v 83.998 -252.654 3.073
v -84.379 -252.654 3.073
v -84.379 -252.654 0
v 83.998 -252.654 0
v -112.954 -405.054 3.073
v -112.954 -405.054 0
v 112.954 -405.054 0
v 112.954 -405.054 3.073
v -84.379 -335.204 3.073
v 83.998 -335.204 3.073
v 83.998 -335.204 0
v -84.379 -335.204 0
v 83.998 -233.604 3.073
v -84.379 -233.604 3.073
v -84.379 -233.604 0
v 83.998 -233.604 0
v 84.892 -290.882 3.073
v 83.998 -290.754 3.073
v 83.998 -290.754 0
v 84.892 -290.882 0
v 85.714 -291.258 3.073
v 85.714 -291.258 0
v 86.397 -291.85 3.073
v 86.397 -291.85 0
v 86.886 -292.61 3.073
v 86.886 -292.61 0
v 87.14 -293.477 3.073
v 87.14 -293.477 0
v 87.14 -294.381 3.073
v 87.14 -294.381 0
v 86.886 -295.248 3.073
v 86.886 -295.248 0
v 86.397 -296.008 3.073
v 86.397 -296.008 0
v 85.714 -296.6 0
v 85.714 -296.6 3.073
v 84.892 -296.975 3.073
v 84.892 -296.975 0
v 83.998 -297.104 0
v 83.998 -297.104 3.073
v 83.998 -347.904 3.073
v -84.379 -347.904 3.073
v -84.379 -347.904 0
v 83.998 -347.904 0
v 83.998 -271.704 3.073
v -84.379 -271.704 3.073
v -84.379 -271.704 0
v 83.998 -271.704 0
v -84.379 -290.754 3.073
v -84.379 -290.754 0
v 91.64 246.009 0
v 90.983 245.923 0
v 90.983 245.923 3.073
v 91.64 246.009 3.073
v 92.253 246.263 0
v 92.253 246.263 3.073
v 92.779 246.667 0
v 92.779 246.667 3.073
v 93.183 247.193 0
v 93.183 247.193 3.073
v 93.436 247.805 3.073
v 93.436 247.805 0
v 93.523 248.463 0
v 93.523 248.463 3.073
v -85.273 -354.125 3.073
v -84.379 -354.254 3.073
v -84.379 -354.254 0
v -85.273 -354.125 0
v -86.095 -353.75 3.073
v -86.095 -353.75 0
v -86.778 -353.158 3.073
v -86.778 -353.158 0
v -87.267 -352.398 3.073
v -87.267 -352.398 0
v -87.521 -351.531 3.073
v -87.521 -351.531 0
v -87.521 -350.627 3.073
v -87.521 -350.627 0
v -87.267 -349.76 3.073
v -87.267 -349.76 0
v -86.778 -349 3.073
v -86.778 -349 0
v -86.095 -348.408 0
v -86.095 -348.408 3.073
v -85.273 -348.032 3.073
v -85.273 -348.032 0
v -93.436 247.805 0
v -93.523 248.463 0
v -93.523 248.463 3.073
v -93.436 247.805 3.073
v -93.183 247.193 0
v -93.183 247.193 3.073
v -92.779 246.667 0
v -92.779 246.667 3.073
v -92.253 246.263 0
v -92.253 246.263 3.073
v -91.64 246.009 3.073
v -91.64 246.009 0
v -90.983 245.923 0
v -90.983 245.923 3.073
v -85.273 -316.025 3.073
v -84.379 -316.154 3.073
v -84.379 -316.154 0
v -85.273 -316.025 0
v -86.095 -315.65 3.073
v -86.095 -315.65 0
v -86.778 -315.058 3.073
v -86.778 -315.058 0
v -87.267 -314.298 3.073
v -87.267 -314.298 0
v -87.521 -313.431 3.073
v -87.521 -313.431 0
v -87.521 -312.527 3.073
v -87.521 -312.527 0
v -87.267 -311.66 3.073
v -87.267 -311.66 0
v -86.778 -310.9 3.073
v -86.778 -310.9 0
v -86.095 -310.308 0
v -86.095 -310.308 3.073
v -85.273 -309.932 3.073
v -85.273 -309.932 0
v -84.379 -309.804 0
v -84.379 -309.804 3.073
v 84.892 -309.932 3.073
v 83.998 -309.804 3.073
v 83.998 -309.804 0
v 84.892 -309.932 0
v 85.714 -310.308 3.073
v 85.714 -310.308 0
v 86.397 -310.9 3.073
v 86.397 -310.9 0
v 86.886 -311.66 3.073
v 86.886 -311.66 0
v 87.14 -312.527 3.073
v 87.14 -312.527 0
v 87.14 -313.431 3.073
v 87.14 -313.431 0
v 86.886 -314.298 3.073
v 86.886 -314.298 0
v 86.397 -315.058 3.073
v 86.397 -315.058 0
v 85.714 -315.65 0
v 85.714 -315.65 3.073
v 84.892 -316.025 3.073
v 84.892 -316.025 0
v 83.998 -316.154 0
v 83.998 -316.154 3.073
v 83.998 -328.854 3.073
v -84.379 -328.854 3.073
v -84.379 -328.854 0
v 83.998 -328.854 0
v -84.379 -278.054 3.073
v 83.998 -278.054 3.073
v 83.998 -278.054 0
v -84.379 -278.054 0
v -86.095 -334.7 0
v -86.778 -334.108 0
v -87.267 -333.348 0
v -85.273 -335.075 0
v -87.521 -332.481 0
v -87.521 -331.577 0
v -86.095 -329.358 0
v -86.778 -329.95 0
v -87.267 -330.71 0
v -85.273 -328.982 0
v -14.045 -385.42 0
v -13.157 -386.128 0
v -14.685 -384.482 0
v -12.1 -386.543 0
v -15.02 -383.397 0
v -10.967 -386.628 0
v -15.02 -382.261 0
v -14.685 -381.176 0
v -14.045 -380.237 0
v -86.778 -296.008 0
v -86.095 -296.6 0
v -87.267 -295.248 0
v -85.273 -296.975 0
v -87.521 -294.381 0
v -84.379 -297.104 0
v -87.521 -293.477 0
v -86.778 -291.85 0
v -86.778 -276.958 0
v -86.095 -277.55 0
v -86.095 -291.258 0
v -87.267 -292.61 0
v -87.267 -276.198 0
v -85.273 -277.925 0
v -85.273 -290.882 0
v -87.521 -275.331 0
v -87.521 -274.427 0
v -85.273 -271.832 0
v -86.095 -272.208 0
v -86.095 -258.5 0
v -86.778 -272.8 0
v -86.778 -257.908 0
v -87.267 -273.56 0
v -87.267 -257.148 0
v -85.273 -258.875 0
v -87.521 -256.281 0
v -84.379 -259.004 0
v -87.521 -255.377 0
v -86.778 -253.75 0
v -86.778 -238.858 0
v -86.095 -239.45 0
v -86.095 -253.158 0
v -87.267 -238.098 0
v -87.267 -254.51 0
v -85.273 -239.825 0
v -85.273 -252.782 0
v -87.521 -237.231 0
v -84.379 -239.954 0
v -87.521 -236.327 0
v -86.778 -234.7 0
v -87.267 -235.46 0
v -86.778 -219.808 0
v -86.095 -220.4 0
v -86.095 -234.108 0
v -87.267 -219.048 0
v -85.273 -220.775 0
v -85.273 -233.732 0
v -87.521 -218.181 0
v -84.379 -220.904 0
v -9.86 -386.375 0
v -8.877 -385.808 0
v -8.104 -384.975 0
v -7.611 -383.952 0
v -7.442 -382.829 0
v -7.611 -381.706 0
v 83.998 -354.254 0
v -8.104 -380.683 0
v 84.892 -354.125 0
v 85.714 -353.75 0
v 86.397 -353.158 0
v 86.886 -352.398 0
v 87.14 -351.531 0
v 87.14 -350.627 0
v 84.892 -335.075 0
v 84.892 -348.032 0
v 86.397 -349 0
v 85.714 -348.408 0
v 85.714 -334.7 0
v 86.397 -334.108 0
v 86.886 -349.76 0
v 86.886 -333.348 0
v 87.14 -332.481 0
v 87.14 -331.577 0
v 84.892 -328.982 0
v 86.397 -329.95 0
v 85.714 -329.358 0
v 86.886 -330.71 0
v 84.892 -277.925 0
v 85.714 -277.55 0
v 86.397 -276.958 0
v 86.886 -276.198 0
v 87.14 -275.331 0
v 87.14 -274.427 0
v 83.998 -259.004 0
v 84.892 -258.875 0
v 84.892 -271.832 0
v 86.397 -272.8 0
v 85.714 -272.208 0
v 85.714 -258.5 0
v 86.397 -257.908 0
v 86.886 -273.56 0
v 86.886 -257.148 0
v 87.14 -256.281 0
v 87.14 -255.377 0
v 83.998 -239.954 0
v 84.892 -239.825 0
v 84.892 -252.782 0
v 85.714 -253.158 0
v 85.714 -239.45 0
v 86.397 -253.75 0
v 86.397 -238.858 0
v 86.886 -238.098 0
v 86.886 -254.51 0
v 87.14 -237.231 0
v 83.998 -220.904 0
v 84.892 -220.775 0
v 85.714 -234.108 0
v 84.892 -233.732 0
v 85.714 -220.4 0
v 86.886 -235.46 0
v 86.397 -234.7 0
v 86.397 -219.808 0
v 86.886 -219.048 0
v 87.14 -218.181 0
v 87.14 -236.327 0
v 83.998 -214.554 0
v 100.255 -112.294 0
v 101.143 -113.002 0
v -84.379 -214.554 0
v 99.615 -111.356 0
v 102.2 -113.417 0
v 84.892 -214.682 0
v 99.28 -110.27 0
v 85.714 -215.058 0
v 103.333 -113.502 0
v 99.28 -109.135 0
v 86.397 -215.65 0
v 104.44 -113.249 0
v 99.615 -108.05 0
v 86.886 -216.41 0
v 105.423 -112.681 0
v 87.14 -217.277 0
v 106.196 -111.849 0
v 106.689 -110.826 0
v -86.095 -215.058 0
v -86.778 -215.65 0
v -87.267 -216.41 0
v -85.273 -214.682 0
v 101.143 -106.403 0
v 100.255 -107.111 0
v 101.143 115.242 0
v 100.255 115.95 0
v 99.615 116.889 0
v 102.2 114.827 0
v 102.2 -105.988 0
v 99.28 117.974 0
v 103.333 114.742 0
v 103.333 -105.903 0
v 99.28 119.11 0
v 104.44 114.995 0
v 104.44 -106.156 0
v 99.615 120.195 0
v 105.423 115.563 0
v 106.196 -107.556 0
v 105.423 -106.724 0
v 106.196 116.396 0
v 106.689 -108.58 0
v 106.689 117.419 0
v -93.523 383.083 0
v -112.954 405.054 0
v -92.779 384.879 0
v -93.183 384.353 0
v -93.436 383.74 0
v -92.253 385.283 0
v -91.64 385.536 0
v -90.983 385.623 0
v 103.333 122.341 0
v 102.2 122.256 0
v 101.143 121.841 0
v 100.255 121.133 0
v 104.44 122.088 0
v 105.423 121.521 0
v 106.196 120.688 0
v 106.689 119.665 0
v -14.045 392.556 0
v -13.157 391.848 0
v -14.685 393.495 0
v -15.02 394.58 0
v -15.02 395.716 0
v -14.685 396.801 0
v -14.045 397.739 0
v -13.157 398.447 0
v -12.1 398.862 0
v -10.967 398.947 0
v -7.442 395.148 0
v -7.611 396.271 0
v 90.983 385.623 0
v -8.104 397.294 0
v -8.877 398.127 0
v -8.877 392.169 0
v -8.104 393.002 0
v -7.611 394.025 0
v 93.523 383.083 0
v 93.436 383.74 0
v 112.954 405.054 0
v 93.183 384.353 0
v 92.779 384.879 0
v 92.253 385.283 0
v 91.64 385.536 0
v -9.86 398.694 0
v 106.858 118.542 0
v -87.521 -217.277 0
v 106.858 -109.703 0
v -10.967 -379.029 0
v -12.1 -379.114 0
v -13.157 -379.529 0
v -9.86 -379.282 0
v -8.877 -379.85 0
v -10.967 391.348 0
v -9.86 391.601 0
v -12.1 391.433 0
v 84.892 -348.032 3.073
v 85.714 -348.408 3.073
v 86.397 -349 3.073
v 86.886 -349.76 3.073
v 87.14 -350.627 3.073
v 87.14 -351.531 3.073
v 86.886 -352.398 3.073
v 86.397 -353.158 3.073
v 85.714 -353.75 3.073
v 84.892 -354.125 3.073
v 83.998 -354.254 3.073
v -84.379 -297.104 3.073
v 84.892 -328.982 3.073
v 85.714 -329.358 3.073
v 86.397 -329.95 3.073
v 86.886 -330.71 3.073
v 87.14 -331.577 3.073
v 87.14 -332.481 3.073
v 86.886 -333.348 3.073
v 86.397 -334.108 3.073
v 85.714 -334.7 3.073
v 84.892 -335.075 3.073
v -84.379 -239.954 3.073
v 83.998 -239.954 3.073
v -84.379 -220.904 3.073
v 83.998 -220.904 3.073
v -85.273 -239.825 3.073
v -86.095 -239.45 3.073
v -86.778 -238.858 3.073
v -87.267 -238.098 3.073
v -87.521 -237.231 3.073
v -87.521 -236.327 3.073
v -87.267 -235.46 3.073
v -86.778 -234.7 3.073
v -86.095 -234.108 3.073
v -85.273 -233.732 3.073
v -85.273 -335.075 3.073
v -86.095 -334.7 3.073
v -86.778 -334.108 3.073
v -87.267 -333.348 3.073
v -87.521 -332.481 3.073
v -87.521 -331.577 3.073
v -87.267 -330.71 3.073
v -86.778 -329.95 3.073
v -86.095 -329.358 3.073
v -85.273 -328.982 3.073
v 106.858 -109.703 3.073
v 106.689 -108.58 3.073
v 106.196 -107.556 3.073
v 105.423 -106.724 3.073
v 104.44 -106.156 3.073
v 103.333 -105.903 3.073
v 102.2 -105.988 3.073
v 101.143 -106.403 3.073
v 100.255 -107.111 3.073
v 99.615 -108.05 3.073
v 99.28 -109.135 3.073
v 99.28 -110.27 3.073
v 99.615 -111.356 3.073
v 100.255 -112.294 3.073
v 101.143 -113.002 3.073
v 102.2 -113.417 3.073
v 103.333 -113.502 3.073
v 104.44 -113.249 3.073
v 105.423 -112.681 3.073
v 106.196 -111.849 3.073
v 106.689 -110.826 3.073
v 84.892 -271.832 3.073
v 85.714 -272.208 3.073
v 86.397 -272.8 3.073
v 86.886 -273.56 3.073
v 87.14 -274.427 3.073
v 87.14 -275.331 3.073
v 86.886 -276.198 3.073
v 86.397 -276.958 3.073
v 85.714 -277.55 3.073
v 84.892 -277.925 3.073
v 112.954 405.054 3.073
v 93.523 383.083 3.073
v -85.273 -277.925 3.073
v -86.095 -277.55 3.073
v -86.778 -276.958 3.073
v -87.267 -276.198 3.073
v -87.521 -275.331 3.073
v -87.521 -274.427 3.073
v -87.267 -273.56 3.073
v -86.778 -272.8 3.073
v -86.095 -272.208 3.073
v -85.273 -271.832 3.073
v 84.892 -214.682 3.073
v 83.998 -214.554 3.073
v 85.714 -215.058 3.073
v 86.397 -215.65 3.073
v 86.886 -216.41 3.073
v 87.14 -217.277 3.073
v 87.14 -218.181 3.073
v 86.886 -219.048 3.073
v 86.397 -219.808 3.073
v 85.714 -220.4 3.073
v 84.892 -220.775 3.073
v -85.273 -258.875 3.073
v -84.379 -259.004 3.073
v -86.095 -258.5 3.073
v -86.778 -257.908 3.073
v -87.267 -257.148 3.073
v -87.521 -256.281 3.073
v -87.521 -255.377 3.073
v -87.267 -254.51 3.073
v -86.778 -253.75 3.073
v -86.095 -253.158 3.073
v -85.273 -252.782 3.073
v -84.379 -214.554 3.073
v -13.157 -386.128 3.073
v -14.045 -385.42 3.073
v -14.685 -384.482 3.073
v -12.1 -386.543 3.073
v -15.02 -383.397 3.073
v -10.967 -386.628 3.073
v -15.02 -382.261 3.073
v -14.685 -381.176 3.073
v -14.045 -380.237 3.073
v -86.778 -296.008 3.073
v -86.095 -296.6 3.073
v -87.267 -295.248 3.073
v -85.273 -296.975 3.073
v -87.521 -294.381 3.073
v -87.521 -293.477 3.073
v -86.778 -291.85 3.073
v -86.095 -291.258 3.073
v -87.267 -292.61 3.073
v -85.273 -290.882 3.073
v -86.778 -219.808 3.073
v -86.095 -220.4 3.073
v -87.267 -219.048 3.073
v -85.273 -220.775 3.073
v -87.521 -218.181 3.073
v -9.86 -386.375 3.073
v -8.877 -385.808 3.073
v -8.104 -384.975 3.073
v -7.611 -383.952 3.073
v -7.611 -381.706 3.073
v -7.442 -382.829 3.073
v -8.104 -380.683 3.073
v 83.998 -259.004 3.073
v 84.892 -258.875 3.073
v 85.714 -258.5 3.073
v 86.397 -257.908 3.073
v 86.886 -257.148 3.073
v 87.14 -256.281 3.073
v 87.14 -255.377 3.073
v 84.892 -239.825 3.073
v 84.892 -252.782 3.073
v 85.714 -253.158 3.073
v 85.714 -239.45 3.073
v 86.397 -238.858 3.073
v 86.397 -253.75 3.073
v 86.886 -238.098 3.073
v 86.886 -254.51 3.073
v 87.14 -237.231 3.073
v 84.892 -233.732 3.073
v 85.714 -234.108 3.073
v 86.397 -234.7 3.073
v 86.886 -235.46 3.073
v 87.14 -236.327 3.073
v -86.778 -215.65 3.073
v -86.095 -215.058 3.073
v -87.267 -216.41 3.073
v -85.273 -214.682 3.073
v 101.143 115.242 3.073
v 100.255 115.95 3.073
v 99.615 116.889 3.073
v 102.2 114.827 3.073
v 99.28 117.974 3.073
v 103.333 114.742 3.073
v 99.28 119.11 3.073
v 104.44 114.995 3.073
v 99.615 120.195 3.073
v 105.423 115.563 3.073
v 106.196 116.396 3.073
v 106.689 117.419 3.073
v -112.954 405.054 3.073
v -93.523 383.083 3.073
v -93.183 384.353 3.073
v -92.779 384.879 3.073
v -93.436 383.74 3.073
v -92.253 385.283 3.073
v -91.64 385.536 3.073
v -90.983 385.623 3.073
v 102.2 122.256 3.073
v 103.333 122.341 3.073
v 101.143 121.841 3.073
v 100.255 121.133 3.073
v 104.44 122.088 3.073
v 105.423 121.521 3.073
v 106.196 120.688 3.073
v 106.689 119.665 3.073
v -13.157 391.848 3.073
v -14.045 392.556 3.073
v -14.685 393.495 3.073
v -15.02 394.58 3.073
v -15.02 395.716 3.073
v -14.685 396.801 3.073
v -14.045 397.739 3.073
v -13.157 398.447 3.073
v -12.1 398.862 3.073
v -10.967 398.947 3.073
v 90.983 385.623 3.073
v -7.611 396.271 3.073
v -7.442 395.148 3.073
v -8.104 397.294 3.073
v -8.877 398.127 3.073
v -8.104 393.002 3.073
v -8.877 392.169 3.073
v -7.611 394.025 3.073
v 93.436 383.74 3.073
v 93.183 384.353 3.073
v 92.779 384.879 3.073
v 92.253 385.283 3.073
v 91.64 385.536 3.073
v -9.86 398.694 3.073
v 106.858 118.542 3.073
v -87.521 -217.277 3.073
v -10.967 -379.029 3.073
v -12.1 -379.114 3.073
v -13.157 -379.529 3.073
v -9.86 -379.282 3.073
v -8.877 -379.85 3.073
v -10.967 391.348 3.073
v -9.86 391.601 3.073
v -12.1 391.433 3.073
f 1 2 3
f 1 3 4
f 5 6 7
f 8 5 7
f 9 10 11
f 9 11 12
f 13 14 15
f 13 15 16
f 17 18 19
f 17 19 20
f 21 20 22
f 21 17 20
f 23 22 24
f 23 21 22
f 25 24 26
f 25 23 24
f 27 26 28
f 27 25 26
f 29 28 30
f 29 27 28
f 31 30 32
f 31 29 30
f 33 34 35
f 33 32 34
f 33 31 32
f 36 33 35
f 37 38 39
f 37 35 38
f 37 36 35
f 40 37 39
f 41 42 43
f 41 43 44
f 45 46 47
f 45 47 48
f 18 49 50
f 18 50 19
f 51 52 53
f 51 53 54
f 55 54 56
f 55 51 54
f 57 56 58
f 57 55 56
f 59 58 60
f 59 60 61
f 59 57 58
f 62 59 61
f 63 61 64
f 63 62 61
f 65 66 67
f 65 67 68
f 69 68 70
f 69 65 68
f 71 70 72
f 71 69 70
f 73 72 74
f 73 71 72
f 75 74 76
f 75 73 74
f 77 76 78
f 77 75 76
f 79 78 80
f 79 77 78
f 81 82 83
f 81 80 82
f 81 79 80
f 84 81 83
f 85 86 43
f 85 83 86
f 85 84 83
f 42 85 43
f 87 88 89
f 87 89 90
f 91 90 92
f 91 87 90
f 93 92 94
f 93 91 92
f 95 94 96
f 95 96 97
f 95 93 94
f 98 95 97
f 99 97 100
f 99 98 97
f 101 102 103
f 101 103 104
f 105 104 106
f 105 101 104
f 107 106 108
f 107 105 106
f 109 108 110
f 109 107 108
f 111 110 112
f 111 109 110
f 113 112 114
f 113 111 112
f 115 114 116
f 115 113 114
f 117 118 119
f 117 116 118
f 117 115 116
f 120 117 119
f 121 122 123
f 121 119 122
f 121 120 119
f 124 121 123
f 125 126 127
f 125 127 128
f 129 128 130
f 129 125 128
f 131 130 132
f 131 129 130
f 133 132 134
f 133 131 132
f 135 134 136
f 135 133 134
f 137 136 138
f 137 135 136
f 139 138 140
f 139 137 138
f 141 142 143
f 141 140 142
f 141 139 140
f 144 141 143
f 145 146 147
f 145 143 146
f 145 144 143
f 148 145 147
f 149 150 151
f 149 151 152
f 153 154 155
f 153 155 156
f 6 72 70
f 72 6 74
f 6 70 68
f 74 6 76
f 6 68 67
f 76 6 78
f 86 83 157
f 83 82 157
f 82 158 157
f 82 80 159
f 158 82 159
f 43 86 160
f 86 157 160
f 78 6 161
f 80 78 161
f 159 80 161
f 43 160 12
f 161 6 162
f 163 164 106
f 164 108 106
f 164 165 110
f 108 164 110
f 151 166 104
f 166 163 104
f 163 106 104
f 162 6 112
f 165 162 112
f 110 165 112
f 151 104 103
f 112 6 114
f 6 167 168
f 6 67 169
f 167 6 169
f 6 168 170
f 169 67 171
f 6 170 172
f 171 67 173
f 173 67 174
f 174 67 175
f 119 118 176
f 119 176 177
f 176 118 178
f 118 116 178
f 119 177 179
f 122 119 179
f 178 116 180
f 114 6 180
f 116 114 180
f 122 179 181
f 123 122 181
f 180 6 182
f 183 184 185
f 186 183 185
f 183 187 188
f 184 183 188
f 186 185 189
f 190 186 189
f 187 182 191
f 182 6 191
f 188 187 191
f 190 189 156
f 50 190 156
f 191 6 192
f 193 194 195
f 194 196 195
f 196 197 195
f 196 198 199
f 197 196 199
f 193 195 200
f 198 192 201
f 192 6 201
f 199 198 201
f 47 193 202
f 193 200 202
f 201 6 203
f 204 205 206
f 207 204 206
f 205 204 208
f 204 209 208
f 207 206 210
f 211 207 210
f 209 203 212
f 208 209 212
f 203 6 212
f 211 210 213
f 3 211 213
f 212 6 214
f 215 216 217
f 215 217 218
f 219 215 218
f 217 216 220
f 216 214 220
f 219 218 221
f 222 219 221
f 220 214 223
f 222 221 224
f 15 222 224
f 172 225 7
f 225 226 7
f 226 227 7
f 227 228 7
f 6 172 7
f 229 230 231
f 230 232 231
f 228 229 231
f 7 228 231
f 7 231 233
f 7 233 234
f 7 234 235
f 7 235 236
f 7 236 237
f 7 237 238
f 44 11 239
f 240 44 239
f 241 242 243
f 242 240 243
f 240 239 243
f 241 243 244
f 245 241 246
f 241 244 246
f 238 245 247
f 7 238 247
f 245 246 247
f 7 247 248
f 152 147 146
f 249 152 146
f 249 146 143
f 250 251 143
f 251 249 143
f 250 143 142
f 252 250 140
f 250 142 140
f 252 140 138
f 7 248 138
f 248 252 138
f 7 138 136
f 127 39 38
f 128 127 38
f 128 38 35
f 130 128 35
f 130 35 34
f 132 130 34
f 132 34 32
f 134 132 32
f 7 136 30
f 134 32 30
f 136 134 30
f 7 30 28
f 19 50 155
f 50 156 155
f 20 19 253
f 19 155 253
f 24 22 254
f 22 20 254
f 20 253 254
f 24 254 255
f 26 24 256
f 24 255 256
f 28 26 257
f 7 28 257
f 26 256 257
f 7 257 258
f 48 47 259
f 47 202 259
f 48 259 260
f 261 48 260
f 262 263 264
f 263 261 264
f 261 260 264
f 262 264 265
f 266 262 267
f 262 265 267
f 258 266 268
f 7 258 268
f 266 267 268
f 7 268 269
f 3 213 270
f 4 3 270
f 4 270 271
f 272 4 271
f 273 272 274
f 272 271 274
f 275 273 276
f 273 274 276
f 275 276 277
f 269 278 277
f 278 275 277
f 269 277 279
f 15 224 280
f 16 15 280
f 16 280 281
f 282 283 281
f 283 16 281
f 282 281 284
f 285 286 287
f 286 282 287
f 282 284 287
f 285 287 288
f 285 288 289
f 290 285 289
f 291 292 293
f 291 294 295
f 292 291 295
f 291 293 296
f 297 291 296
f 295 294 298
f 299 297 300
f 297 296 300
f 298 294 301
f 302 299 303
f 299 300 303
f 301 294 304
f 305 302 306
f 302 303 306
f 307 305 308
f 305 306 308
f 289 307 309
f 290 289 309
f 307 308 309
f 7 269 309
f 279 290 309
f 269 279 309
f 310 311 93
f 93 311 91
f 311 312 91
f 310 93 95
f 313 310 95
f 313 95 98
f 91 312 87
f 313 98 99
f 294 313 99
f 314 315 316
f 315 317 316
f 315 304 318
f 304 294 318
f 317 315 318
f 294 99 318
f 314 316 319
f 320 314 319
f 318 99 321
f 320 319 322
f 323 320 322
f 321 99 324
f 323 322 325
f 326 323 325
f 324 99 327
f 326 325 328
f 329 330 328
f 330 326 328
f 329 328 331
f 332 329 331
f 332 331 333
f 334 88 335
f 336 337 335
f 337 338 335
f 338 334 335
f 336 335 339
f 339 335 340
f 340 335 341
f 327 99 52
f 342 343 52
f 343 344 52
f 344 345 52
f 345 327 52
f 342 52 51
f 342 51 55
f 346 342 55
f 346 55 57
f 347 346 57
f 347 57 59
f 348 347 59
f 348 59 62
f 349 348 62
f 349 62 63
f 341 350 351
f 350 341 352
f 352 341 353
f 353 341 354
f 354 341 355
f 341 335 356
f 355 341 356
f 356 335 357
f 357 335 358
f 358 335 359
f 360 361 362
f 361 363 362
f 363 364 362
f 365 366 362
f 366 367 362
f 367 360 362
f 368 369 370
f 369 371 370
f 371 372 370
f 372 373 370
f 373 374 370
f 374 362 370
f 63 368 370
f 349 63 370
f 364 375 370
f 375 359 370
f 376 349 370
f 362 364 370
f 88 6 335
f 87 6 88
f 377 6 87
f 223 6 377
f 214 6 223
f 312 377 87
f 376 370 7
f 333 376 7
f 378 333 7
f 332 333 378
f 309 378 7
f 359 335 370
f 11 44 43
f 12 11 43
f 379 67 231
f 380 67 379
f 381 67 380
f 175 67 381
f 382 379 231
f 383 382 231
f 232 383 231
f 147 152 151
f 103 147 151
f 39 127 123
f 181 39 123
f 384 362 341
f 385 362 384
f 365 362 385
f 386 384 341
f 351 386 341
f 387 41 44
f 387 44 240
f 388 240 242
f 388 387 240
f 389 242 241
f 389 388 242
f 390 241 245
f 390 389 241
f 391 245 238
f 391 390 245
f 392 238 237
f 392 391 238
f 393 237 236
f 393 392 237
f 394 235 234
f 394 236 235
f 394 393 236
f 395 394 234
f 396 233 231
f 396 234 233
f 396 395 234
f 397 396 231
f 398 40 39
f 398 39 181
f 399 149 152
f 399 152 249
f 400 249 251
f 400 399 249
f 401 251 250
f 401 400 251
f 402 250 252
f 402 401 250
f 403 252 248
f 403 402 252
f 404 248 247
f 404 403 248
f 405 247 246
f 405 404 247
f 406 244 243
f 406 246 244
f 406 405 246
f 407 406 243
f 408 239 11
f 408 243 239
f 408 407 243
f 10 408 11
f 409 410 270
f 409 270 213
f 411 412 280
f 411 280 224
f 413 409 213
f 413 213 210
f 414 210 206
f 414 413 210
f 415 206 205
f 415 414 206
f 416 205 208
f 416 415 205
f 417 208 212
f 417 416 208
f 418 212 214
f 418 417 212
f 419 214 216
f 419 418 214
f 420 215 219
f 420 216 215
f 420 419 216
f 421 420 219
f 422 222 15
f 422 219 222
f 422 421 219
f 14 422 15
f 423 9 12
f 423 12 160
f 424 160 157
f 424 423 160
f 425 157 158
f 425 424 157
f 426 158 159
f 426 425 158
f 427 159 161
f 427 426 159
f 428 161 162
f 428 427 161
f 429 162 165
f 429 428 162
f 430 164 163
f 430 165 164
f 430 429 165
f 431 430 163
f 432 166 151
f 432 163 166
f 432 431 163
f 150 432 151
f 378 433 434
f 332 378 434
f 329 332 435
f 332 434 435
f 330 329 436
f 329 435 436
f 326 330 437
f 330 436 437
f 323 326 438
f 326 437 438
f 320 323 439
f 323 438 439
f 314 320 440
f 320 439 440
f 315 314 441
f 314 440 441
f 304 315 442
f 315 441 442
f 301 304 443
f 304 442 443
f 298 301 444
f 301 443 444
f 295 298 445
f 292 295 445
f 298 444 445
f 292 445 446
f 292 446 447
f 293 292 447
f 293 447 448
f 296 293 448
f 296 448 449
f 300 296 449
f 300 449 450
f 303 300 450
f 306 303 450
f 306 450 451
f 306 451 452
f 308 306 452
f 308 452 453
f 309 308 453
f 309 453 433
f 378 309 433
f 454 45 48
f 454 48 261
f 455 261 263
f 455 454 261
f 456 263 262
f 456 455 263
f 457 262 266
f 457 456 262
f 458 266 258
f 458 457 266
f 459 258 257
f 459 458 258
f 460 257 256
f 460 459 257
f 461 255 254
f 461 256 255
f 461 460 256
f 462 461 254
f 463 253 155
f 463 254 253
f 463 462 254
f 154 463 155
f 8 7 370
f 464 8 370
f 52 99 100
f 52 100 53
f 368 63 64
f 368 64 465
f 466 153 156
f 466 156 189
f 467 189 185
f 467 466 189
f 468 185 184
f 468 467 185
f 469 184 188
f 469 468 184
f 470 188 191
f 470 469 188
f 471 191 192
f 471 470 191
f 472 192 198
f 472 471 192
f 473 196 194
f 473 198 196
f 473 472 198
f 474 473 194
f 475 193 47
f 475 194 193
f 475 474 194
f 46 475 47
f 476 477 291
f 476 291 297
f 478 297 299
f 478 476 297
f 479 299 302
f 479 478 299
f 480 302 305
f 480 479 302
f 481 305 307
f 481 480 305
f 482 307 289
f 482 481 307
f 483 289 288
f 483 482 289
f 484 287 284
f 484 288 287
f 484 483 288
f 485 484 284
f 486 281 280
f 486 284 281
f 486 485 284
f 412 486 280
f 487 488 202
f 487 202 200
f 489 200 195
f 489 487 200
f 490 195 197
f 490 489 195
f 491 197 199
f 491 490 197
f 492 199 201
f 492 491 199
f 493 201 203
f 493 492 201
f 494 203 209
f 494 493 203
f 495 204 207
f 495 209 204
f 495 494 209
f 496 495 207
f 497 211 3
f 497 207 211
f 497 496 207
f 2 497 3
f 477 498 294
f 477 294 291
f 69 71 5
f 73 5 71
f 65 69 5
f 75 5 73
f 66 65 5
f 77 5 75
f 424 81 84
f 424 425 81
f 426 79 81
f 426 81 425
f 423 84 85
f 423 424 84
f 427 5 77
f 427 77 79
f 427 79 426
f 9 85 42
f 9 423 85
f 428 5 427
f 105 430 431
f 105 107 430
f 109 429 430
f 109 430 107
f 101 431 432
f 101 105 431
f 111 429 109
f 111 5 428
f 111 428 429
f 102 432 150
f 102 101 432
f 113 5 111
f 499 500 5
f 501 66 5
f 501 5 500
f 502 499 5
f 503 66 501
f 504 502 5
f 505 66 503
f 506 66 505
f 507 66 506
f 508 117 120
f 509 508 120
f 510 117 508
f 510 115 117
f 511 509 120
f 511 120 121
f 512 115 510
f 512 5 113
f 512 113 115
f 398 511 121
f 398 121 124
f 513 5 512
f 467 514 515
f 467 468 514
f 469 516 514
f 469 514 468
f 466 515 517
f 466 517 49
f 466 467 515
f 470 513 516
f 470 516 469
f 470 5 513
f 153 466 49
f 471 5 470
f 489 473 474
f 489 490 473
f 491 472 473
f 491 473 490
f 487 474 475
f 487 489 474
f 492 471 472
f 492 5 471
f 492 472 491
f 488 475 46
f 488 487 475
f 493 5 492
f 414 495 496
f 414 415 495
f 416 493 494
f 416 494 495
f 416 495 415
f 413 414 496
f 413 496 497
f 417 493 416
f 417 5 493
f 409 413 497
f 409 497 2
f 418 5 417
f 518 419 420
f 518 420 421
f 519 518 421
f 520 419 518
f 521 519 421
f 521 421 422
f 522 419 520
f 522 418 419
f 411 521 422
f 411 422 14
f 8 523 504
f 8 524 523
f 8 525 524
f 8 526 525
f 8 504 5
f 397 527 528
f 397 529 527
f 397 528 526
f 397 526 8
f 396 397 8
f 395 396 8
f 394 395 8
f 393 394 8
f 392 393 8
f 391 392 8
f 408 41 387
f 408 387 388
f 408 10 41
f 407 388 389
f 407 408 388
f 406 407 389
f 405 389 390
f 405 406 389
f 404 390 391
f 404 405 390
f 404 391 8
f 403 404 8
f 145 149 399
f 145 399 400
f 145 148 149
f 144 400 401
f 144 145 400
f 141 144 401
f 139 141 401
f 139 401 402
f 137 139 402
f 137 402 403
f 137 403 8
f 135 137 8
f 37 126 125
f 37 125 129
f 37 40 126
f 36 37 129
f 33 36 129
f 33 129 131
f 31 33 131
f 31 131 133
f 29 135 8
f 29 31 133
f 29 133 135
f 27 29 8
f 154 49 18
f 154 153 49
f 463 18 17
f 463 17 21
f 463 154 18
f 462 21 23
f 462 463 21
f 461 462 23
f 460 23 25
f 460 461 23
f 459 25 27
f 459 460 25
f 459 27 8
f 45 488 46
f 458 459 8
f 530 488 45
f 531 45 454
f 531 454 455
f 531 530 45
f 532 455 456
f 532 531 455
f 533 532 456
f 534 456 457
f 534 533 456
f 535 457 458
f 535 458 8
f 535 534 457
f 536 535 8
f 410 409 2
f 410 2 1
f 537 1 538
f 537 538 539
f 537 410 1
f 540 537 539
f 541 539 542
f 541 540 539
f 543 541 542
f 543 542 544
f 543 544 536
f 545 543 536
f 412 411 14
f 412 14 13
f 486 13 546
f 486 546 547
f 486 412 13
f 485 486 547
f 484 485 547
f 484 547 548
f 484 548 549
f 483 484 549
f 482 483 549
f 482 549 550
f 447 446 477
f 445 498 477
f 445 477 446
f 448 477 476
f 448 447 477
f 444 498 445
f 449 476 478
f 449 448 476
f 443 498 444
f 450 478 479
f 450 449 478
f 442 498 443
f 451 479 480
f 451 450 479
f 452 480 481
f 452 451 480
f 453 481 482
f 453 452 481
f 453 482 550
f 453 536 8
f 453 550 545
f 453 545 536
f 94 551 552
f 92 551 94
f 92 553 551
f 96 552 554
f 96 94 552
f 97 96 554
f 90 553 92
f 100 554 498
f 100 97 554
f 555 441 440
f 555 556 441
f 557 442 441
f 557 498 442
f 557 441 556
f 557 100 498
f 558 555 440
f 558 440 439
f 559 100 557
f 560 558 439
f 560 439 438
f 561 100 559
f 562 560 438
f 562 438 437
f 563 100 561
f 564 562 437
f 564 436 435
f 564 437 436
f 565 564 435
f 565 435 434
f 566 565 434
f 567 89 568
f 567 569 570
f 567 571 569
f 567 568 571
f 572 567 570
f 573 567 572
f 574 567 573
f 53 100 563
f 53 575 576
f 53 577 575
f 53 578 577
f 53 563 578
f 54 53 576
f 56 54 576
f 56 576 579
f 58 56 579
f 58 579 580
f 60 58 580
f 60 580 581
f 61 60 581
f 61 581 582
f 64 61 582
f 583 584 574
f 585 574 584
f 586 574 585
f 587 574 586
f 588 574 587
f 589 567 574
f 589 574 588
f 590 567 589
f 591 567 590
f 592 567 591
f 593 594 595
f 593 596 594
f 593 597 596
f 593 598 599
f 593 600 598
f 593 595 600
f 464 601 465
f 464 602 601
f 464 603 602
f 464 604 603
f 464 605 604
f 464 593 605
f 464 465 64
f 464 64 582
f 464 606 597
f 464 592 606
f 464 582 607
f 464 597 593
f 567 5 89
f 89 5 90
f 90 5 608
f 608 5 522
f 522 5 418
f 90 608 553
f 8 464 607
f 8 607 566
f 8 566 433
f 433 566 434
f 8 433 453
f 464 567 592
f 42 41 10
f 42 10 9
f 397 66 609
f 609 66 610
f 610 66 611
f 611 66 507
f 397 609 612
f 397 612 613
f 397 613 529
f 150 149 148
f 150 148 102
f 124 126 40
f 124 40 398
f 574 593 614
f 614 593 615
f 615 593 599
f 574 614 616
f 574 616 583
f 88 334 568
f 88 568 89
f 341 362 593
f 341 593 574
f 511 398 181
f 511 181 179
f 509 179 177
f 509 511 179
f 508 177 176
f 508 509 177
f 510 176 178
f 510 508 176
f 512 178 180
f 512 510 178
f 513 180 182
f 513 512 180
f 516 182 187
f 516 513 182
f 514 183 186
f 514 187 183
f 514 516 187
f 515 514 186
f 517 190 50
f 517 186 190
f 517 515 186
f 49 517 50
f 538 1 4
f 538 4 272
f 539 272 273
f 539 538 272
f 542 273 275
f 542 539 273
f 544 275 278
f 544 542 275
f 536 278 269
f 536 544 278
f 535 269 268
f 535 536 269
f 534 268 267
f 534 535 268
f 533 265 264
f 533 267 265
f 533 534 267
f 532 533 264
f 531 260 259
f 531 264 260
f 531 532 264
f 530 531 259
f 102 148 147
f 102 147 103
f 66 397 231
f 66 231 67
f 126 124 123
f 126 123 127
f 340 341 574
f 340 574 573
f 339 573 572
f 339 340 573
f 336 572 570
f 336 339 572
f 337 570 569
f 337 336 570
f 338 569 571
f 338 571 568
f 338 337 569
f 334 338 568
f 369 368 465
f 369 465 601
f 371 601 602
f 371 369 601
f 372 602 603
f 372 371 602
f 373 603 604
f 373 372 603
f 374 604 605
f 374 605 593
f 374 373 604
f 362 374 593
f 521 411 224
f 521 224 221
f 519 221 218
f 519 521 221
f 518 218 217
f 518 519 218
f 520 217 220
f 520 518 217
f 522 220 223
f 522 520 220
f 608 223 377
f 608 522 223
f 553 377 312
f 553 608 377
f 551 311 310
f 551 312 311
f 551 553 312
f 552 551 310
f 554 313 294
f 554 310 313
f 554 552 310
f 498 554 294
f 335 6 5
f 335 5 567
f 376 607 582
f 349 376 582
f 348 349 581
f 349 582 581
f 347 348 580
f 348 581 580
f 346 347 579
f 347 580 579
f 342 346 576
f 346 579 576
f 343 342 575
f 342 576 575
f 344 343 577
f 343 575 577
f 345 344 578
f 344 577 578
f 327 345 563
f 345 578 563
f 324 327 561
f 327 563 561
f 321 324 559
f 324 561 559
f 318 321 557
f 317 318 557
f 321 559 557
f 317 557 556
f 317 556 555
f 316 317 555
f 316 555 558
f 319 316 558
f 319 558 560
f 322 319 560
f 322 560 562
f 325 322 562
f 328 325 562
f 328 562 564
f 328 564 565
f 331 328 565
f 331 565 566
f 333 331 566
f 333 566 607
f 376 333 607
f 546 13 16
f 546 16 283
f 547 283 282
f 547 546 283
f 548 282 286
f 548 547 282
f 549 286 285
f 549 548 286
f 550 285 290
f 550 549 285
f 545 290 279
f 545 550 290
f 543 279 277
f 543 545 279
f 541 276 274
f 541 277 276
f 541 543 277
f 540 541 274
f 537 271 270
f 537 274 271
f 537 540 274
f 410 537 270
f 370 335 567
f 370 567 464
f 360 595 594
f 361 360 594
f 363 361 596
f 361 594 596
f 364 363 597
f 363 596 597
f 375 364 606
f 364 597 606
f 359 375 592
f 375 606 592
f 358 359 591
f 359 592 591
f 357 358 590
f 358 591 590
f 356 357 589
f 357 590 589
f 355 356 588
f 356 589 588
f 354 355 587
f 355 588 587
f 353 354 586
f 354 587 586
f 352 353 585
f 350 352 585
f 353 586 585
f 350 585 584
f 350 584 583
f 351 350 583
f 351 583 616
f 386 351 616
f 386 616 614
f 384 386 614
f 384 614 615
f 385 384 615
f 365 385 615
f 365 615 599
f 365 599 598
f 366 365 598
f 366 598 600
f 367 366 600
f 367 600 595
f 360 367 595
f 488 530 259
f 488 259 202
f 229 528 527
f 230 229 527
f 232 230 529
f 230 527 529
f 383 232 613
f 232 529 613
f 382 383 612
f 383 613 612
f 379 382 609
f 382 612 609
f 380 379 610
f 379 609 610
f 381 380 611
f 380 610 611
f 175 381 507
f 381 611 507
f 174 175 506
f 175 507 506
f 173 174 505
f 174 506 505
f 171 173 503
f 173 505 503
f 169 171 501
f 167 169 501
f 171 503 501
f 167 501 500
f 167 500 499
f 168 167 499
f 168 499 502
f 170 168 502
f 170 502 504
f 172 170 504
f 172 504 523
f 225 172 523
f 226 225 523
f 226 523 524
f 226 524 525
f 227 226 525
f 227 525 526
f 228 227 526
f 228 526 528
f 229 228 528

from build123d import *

# Parameters (mm, degrees)
SKETCH1_W           = 225.9076
SKETCH1_H           = 810.1076
BOSS_EXTRUDE1_DEPTH = 3.0734
VENTMASTER_DEPTH    = 421.519425968
LPATTERN1_COUNT     = 8
LPATTERN1_PITCH     = 19.05
CUT_EXTRUDE2_DEPTH  = 3.0734
SKETCH4_R           = 3.81
CUT_EXTRUDE3_DEPTH  = 421.519425968


# Read off the part's stored shape, not the designer's step: Cut-Extrude2
with BuildPart() as part:
    # Sketch1 → Boss-Extrude1 (new body)
    with BuildSketch(Plane.XY):
        Rectangle(SKETCH1_W, SKETCH1_H)
    extrude(amount=BOSS_EXTRUDE1_DEPTH)

    # Sketch2 → VentMaster (cut, through all)
    with BuildSketch(Plane.XY.offset(3.0734)):
        with BuildLine():
            Line((-84.3788, -347.9038), (83.9978, -347.9038))
            ThreePointArc((83.9978, -347.9038), (87.1728, -351.0788), (83.9978, -354.2538))
            Line((83.9978, -354.2538), (-84.3788, -354.2538))
            ThreePointArc((-84.3788, -354.2538), (-87.5538, -351.0788), (-84.3788, -347.9038))
        make_face()
    ventmaster = extrude(amount=-VENTMASTER_DEPTH, mode=Mode.SUBTRACT)

    # LPattern1: VentMaster ×8
    with Locations(*[(0, i * LPATTERN1_PITCH, 0) for i in range(1, LPATTERN1_COUNT)]):
        add(ventmaster, mode=Mode.SUBTRACT)

    # Cut-Extrude2 outline → Cut-Extrude2 (cut)
    with BuildSketch(Plane.XY):
        with BuildLine():
            Line((-93.5228, 383.0828), (-93.5228, 248.4628))
            ThreePointArc((-93.5228, 248.4628), (-92.778851224, 246.666748776), (-90.9828, 245.9228))
            Line((-90.9828, 245.9228), (90.9828, 245.9228))
            ThreePointArc((90.9828, 245.9228), (92.778851224, 246.666748776), (93.5228, 248.4628))
            Line((93.5228, 248.4628), (93.5228, 383.0828))
            ThreePointArc((93.5228, 383.0828), (92.778851224, 384.878851224), (90.9828, 385.6228))
            Line((90.9828, 385.6228), (-90.9828, 385.6228))
            ThreePointArc((-90.9828, 385.6228), (-92.778851224, 384.878851224), (-93.5228, 383.0828))
        make_face()
    extrude(amount=CUT_EXTRUDE2_DEPTH, mode=Mode.SUBTRACT)

    # Sketch4 → Cut-Extrude3 (cut, through all)
    with BuildSketch(Plane.XY.offset(3.0734)):
        with Locations((-11.2522, 395.1478)):
            Circle(SKETCH4_R)
        with Locations((-11.2522, -382.8288)):
            Circle(SKETCH4_R)
        with Locations((103.0478, -109.7026)):
            Circle(SKETCH4_R)
        with Locations((103.0478, 118.5418)):
            Circle(SKETCH4_R)
    extrude(amount=-CUT_EXTRUDE3_DEPTH, mode=Mode.SUBTRACT)


solid = part.part
